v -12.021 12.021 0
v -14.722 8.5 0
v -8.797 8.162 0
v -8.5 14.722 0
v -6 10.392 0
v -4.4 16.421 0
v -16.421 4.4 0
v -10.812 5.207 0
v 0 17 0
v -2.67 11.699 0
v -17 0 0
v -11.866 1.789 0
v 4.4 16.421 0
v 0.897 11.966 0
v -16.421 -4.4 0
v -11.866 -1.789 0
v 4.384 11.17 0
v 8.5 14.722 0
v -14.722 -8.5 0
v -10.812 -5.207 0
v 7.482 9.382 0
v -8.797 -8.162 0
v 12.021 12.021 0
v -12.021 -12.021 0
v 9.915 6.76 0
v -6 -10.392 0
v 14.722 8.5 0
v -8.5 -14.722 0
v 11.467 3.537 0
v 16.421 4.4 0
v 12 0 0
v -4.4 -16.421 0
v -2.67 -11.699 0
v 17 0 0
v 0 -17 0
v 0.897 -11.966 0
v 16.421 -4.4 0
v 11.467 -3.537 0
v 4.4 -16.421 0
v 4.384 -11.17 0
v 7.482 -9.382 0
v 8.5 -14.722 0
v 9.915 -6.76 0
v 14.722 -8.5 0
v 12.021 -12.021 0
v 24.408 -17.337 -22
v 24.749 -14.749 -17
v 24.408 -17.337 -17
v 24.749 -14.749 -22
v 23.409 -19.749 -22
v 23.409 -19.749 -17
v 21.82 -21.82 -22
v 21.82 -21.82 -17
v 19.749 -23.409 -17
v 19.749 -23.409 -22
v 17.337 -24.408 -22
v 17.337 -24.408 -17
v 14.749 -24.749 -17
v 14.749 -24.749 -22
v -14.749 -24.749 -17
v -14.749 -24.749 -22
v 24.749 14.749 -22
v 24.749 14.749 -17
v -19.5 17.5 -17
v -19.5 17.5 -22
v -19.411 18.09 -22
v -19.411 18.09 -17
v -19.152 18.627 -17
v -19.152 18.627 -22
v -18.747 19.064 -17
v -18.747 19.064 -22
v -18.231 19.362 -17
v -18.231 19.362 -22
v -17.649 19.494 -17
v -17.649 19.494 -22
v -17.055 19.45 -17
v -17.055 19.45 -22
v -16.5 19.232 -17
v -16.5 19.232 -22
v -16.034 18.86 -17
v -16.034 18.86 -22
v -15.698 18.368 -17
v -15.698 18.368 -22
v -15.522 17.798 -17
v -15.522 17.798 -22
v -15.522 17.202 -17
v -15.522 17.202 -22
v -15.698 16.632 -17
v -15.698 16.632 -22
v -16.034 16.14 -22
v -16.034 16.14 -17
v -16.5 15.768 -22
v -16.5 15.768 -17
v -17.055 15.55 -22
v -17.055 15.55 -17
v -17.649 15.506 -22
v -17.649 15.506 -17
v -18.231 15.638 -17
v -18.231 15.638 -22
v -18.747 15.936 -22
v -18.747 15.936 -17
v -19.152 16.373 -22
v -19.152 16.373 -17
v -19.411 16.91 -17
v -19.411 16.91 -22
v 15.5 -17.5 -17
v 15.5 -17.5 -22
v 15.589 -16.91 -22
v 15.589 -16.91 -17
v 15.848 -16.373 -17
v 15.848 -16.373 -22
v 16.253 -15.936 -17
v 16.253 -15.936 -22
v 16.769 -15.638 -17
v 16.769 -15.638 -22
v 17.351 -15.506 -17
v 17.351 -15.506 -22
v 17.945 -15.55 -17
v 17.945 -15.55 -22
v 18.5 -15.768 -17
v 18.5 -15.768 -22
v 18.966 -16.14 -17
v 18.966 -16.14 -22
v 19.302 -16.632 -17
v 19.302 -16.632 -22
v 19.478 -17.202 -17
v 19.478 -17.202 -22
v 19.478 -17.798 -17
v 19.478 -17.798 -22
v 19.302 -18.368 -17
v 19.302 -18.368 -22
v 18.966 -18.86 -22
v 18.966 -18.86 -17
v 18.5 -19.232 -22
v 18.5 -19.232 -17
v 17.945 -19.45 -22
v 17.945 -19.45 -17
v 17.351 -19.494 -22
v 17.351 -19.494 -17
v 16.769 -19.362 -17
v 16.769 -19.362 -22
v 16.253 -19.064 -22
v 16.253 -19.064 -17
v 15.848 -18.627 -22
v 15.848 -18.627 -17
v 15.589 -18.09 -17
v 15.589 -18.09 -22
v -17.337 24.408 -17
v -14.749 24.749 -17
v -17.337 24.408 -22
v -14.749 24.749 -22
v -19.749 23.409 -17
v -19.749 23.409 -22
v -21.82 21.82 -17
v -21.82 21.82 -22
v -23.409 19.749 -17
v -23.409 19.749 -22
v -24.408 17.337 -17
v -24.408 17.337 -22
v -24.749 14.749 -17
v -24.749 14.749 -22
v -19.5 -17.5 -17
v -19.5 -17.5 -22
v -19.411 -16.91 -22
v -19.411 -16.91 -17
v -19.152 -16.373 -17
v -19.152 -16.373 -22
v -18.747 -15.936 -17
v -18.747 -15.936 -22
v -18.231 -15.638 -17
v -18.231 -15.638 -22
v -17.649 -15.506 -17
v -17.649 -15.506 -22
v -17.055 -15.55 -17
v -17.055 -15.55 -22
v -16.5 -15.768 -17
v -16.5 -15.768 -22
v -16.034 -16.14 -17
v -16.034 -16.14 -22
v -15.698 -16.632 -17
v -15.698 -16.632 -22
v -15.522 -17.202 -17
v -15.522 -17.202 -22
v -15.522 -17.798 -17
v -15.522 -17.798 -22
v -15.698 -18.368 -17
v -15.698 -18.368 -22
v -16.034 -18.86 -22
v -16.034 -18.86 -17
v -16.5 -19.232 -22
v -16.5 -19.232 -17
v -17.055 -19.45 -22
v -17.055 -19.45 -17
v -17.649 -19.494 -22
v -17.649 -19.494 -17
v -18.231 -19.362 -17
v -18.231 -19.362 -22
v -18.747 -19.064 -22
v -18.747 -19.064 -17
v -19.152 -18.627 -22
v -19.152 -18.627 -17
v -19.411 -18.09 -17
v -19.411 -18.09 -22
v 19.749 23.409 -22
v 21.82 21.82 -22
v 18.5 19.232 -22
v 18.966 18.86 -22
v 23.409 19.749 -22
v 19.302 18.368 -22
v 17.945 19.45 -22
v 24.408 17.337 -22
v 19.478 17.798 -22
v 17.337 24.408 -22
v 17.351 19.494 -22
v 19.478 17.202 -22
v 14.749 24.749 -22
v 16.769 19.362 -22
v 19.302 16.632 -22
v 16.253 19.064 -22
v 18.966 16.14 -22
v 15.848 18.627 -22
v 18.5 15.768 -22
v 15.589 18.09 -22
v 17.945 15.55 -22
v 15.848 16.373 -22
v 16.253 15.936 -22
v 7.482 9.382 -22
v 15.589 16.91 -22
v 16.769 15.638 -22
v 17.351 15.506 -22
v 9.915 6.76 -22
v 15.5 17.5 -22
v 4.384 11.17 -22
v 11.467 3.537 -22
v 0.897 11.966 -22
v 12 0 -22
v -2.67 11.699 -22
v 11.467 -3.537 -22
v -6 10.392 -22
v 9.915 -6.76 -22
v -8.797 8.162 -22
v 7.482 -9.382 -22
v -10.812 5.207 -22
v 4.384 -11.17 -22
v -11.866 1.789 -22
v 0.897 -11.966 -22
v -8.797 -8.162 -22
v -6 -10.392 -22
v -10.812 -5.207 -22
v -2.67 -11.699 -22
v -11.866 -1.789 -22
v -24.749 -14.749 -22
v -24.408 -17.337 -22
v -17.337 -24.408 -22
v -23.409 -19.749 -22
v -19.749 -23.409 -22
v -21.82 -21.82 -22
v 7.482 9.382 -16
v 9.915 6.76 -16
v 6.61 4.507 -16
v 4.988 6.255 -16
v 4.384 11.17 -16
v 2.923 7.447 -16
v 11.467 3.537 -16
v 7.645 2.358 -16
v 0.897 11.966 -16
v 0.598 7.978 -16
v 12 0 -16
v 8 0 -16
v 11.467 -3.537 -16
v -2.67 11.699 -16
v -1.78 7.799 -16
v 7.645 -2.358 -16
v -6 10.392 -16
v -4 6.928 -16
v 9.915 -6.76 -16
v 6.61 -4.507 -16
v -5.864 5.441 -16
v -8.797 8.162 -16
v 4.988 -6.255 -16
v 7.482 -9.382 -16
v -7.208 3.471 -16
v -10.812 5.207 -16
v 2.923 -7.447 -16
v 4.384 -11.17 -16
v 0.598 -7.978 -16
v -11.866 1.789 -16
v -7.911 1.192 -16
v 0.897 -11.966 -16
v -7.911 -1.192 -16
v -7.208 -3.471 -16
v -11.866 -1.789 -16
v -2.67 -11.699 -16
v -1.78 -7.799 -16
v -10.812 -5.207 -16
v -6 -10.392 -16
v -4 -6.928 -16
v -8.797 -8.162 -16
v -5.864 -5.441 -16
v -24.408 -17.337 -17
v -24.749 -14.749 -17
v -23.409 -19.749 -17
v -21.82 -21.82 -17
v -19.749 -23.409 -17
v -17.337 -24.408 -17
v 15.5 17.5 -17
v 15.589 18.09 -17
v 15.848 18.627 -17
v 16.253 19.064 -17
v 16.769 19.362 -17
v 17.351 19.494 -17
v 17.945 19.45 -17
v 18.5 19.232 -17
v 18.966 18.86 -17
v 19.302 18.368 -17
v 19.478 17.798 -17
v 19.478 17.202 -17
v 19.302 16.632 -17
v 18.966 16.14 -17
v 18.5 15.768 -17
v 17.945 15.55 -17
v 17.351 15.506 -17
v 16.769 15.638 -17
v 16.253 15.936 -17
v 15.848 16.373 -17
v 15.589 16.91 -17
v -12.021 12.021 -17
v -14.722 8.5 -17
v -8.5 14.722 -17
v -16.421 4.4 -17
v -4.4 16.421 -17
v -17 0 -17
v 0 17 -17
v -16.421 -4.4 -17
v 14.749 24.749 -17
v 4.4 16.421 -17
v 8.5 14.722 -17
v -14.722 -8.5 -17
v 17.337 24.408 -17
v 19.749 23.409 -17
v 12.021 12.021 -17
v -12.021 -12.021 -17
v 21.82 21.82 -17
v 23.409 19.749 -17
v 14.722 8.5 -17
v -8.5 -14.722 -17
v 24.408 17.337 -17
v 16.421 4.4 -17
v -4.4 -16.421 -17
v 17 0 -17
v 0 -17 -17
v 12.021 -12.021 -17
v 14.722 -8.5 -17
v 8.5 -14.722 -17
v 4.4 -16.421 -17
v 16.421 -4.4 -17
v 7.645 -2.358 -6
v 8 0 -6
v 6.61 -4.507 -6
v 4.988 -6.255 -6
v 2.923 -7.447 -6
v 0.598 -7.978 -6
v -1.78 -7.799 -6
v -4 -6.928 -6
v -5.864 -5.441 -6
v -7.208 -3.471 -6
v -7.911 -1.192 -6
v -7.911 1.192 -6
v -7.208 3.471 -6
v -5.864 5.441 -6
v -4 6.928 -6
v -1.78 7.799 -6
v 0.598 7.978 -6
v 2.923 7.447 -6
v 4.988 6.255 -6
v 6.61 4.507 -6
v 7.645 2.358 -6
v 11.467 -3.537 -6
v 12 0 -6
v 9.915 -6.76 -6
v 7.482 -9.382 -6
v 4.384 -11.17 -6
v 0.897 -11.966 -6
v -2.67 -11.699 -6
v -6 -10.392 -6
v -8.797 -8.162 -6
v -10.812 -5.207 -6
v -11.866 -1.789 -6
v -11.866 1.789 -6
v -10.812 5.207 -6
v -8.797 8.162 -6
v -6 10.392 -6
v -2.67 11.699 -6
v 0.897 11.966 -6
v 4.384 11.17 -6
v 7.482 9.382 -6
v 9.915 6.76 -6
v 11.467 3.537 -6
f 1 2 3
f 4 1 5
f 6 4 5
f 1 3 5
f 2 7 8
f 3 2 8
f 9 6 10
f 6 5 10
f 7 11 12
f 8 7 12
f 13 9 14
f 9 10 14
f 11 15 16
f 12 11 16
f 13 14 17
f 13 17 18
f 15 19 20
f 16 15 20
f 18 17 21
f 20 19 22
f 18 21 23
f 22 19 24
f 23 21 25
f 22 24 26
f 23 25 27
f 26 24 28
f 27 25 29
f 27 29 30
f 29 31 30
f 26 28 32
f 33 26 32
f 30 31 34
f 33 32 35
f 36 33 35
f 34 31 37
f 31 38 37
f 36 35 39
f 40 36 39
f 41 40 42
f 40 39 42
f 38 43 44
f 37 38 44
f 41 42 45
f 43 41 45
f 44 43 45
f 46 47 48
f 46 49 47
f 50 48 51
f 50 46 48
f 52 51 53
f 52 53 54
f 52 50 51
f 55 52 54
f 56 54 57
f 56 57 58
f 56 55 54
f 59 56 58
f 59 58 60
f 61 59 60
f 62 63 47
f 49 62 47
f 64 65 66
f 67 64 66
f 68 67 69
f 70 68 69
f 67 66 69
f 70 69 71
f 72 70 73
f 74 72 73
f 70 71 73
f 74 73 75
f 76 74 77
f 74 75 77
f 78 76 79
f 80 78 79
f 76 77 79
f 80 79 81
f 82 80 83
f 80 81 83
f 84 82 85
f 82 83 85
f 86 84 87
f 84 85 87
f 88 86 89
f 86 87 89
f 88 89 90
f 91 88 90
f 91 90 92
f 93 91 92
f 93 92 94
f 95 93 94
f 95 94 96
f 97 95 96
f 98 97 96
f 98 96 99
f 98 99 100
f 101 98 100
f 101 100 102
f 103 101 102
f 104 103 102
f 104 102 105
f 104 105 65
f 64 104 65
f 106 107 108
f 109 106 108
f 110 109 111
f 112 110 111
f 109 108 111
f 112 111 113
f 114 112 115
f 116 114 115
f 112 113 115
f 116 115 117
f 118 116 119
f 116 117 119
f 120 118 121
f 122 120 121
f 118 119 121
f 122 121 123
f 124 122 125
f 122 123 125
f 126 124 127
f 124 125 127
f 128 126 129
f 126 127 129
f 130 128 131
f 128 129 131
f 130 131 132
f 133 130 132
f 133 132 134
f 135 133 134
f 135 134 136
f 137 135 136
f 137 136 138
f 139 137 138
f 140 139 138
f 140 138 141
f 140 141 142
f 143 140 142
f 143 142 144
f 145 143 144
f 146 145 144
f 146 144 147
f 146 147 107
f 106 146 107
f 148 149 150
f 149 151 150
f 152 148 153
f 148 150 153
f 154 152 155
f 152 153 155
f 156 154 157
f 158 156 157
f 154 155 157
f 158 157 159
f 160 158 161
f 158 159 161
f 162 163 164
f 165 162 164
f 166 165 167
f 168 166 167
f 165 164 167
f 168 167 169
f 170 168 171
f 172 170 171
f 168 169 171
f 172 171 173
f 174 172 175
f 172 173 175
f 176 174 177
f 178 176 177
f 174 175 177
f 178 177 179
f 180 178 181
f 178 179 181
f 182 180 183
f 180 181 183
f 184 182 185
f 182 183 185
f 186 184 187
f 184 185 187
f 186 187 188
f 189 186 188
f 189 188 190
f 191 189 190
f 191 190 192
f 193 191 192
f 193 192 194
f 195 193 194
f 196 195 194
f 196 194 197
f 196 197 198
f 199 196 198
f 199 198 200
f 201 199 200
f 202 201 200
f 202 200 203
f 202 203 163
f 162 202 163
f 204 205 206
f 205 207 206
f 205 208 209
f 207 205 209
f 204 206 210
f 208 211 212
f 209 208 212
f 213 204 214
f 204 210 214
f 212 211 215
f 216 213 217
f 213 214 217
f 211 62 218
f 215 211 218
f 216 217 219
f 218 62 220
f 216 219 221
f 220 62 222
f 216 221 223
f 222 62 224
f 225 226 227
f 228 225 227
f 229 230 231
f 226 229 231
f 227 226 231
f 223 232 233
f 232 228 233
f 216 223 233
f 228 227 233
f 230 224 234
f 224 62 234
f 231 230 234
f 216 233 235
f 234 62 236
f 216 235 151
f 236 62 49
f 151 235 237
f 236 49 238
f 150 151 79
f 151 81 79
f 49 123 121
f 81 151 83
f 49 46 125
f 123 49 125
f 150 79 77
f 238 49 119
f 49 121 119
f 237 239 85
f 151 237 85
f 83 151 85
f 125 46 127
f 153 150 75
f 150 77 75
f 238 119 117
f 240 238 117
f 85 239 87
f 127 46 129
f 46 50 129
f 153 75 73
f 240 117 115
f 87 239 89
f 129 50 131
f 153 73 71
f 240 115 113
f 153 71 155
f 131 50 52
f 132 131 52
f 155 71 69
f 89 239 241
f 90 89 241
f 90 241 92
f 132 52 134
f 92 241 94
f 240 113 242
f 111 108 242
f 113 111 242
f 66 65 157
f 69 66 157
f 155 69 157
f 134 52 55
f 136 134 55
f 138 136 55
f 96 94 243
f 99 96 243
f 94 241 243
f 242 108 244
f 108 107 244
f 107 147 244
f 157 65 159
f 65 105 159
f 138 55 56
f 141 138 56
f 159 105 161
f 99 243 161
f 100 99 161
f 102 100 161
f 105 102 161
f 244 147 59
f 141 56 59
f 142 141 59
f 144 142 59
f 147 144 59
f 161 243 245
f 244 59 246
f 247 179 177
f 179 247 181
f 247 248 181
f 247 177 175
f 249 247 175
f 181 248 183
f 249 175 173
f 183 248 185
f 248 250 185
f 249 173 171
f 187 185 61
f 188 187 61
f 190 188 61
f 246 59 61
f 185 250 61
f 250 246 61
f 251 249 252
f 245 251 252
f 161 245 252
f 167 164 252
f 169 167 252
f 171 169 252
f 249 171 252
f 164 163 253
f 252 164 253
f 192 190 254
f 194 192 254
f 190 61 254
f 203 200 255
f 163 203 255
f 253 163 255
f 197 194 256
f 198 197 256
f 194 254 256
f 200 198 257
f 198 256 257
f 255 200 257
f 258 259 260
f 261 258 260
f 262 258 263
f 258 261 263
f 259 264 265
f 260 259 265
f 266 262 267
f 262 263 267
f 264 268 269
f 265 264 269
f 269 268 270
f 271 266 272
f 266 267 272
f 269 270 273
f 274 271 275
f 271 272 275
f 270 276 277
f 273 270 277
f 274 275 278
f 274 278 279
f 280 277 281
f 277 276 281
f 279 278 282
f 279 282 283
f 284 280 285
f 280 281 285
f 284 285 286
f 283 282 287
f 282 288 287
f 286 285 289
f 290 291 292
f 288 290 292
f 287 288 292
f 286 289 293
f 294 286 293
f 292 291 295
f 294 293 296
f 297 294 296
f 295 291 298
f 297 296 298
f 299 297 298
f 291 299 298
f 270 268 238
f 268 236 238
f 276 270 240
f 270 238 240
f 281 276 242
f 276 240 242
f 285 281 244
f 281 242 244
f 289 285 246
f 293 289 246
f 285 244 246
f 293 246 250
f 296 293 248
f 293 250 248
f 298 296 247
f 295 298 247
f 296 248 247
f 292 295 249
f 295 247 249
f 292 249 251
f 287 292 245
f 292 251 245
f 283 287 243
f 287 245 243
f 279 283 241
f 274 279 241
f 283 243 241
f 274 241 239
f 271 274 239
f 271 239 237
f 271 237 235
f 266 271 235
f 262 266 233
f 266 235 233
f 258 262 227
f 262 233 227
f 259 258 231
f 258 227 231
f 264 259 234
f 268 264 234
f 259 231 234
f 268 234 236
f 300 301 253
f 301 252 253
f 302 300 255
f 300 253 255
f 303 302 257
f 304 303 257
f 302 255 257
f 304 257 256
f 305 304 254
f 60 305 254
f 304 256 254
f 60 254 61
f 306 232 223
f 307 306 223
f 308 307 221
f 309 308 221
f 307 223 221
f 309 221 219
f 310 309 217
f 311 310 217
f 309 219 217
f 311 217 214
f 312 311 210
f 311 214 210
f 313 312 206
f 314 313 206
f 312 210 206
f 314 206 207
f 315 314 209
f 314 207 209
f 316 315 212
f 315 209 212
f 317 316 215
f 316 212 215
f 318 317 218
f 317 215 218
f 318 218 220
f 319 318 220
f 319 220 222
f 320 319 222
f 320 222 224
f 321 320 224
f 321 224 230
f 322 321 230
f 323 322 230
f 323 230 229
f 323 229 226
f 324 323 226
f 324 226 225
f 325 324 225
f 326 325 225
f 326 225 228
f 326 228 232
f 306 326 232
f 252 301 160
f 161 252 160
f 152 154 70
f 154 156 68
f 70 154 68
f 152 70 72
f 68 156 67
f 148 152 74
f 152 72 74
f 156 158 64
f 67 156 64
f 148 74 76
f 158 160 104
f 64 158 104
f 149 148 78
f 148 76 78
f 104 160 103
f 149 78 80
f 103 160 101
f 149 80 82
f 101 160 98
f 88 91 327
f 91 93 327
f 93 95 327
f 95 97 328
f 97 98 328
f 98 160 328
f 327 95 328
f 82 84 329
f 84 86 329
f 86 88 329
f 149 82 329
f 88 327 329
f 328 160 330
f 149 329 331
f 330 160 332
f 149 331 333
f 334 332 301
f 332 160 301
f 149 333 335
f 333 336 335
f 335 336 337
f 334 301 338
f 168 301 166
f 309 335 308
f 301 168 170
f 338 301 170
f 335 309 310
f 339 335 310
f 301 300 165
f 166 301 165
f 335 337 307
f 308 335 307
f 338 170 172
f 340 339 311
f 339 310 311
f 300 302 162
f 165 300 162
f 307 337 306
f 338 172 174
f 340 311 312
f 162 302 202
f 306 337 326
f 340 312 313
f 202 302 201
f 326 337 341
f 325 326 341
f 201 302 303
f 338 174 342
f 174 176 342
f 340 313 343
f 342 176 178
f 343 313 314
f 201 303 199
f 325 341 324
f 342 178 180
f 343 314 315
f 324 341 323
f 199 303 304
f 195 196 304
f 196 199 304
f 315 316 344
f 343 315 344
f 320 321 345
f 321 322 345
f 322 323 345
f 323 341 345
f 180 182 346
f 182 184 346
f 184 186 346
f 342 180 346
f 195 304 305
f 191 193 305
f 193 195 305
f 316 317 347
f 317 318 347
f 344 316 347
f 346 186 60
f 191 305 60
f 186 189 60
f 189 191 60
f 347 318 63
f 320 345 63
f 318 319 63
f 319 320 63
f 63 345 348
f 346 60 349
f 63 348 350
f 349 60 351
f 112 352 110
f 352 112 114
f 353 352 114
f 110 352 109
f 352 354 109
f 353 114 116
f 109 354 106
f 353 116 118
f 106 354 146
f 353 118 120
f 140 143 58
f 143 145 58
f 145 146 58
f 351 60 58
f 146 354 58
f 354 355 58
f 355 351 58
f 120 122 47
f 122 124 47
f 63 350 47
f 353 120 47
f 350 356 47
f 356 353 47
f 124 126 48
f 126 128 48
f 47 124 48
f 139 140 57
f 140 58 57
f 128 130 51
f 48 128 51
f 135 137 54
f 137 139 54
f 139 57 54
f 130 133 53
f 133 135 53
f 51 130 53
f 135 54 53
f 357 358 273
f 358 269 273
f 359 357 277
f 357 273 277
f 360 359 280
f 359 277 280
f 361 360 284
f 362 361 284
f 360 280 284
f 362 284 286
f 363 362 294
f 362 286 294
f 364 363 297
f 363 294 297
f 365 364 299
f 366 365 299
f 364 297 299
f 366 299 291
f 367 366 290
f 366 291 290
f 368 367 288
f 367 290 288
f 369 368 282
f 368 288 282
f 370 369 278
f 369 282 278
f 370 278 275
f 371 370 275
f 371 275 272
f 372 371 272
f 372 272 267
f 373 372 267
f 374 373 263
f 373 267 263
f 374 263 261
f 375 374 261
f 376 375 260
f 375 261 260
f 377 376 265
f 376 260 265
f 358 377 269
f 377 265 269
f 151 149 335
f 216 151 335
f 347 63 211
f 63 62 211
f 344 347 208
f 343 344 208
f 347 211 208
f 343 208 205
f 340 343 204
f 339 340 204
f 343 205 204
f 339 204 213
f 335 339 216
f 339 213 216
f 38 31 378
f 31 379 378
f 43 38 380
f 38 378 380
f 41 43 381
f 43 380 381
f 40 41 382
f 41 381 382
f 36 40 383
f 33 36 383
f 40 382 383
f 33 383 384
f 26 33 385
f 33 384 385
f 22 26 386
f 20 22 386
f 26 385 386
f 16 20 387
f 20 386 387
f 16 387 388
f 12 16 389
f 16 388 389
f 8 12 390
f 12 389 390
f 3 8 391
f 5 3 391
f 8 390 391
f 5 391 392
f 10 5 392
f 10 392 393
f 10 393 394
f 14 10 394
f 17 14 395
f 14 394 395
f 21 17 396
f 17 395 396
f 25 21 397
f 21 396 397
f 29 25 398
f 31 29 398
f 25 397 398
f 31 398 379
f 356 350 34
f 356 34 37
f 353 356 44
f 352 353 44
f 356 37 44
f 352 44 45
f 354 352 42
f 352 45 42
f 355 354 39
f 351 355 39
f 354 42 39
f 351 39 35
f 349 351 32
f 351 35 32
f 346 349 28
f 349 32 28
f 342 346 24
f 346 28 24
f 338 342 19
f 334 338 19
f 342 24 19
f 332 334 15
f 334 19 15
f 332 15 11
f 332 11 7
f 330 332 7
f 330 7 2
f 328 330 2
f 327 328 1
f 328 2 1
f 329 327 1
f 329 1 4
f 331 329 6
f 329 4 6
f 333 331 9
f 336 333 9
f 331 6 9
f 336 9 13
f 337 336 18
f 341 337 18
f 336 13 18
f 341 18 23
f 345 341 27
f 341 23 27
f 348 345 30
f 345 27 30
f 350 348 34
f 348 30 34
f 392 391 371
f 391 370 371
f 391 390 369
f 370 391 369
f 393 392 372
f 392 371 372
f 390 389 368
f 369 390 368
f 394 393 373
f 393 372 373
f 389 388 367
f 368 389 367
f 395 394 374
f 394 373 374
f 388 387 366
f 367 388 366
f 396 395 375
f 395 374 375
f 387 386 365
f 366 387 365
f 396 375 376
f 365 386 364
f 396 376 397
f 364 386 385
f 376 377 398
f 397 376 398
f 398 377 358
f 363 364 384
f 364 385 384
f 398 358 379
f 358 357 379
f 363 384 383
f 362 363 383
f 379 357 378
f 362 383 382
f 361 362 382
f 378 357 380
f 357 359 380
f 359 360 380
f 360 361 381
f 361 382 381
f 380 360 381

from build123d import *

# Parameters (mm, degrees)
CUT_EXTRUDE1_DEPTH = 10
FILLET1_R          = 10
SKETCH5_R          = 2
CUT_EXTRUDE2_DEPTH = 10


with BuildPart() as part:
    # Sketch3 → Revolve1 (revolve)
    with BuildSketch(Plane(origin=(0, 0, 0), x_dir=(0, 0, -1), z_dir=(1, 0, 0)), mode=Mode.PRIVATE) as revolve1_sk:
        Polygon((0, 12), (6, 12), (6, 8), (16, 8), (16, 12), (22, 12), (22, 35), (17, 35), (17, 17), (0, 17), align=None)
    revolve(revolve1_sk.sketch.rotate(Axis((0, 0, 0), (0, 0, -1)), 90), axis=Axis((0, 0, 0), (0, 0, -1)))

    # Sketch4 → Cut-Extrude1 (cut)
    with BuildSketch(Plane.XY.offset(-17)):
        with BuildLine():
            ThreePointArc((35, 0), (32.335783638, 13.393920133), (24.748737342, 24.748737342))
            Line((24.748737342, 24.748737342), (24.748737342, -24.748737342))
            ThreePointArc((24.748737342, -24.748737342), (32.335783638, -13.393920133), (35, 0))
        make_face()
        with BuildLine():
            ThreePointArc((24.748737342, 24.748737342), (0, 35), (-24.748737342, 24.748737342))
            Line((-24.748737342, 24.748737342), (24.748737342, 24.748737342))
        make_face()
        with BuildLine():
            Line((-24.748737342, -24.748737342), (-24.748737342, 24.748737342))
            ThreePointArc((-24.748737342, 24.748737342), (-35, 0), (-24.748737342, -24.748737342))
        make_face()
        with BuildLine():
            Line((24.748737342, -24.748737342), (-24.748737342, -24.748737342))
            ThreePointArc((-24.748737342, -24.748737342), (0, -35), (24.748737342, -24.748737342))
        make_face()
    extrude(amount=-CUT_EXTRUDE1_DEPTH, mode=Mode.SUBTRACT)

    # Fillet1
    fillet1_edges = [part.edges().sort_by_distance(p)[0] for p in [
        (24.748737342, 24.748737342, -19.5),
        (24.748737342, -24.748737342, -19.5),
        (-24.748737342, 24.748737342, -19.5),
        (-24.748737342, -24.748737342, -19.5),
    ]]
    fillet(fillet1_edges, radius=FILLET1_R)

    # Sketch5 → Cut-Extrude2 (cut)
    with BuildSketch(Plane(origin=(0, 0, -22), x_dir=(-1, 0, 0), z_dir=(0, 0, -1))):
        with Locations((-17.5, 17.5)):
            Circle(SKETCH5_R)
        with Locations((17.5, 17.5)):
            Circle(SKETCH5_R)
        with Locations((17.5, -17.5)):
            Circle(SKETCH5_R)
        with Locations((-17.5, -17.5)):
            Circle(SKETCH5_R)
    extrude(amount=-CUT_EXTRUDE2_DEPTH, mode=Mode.SUBTRACT)


solid = part.part
